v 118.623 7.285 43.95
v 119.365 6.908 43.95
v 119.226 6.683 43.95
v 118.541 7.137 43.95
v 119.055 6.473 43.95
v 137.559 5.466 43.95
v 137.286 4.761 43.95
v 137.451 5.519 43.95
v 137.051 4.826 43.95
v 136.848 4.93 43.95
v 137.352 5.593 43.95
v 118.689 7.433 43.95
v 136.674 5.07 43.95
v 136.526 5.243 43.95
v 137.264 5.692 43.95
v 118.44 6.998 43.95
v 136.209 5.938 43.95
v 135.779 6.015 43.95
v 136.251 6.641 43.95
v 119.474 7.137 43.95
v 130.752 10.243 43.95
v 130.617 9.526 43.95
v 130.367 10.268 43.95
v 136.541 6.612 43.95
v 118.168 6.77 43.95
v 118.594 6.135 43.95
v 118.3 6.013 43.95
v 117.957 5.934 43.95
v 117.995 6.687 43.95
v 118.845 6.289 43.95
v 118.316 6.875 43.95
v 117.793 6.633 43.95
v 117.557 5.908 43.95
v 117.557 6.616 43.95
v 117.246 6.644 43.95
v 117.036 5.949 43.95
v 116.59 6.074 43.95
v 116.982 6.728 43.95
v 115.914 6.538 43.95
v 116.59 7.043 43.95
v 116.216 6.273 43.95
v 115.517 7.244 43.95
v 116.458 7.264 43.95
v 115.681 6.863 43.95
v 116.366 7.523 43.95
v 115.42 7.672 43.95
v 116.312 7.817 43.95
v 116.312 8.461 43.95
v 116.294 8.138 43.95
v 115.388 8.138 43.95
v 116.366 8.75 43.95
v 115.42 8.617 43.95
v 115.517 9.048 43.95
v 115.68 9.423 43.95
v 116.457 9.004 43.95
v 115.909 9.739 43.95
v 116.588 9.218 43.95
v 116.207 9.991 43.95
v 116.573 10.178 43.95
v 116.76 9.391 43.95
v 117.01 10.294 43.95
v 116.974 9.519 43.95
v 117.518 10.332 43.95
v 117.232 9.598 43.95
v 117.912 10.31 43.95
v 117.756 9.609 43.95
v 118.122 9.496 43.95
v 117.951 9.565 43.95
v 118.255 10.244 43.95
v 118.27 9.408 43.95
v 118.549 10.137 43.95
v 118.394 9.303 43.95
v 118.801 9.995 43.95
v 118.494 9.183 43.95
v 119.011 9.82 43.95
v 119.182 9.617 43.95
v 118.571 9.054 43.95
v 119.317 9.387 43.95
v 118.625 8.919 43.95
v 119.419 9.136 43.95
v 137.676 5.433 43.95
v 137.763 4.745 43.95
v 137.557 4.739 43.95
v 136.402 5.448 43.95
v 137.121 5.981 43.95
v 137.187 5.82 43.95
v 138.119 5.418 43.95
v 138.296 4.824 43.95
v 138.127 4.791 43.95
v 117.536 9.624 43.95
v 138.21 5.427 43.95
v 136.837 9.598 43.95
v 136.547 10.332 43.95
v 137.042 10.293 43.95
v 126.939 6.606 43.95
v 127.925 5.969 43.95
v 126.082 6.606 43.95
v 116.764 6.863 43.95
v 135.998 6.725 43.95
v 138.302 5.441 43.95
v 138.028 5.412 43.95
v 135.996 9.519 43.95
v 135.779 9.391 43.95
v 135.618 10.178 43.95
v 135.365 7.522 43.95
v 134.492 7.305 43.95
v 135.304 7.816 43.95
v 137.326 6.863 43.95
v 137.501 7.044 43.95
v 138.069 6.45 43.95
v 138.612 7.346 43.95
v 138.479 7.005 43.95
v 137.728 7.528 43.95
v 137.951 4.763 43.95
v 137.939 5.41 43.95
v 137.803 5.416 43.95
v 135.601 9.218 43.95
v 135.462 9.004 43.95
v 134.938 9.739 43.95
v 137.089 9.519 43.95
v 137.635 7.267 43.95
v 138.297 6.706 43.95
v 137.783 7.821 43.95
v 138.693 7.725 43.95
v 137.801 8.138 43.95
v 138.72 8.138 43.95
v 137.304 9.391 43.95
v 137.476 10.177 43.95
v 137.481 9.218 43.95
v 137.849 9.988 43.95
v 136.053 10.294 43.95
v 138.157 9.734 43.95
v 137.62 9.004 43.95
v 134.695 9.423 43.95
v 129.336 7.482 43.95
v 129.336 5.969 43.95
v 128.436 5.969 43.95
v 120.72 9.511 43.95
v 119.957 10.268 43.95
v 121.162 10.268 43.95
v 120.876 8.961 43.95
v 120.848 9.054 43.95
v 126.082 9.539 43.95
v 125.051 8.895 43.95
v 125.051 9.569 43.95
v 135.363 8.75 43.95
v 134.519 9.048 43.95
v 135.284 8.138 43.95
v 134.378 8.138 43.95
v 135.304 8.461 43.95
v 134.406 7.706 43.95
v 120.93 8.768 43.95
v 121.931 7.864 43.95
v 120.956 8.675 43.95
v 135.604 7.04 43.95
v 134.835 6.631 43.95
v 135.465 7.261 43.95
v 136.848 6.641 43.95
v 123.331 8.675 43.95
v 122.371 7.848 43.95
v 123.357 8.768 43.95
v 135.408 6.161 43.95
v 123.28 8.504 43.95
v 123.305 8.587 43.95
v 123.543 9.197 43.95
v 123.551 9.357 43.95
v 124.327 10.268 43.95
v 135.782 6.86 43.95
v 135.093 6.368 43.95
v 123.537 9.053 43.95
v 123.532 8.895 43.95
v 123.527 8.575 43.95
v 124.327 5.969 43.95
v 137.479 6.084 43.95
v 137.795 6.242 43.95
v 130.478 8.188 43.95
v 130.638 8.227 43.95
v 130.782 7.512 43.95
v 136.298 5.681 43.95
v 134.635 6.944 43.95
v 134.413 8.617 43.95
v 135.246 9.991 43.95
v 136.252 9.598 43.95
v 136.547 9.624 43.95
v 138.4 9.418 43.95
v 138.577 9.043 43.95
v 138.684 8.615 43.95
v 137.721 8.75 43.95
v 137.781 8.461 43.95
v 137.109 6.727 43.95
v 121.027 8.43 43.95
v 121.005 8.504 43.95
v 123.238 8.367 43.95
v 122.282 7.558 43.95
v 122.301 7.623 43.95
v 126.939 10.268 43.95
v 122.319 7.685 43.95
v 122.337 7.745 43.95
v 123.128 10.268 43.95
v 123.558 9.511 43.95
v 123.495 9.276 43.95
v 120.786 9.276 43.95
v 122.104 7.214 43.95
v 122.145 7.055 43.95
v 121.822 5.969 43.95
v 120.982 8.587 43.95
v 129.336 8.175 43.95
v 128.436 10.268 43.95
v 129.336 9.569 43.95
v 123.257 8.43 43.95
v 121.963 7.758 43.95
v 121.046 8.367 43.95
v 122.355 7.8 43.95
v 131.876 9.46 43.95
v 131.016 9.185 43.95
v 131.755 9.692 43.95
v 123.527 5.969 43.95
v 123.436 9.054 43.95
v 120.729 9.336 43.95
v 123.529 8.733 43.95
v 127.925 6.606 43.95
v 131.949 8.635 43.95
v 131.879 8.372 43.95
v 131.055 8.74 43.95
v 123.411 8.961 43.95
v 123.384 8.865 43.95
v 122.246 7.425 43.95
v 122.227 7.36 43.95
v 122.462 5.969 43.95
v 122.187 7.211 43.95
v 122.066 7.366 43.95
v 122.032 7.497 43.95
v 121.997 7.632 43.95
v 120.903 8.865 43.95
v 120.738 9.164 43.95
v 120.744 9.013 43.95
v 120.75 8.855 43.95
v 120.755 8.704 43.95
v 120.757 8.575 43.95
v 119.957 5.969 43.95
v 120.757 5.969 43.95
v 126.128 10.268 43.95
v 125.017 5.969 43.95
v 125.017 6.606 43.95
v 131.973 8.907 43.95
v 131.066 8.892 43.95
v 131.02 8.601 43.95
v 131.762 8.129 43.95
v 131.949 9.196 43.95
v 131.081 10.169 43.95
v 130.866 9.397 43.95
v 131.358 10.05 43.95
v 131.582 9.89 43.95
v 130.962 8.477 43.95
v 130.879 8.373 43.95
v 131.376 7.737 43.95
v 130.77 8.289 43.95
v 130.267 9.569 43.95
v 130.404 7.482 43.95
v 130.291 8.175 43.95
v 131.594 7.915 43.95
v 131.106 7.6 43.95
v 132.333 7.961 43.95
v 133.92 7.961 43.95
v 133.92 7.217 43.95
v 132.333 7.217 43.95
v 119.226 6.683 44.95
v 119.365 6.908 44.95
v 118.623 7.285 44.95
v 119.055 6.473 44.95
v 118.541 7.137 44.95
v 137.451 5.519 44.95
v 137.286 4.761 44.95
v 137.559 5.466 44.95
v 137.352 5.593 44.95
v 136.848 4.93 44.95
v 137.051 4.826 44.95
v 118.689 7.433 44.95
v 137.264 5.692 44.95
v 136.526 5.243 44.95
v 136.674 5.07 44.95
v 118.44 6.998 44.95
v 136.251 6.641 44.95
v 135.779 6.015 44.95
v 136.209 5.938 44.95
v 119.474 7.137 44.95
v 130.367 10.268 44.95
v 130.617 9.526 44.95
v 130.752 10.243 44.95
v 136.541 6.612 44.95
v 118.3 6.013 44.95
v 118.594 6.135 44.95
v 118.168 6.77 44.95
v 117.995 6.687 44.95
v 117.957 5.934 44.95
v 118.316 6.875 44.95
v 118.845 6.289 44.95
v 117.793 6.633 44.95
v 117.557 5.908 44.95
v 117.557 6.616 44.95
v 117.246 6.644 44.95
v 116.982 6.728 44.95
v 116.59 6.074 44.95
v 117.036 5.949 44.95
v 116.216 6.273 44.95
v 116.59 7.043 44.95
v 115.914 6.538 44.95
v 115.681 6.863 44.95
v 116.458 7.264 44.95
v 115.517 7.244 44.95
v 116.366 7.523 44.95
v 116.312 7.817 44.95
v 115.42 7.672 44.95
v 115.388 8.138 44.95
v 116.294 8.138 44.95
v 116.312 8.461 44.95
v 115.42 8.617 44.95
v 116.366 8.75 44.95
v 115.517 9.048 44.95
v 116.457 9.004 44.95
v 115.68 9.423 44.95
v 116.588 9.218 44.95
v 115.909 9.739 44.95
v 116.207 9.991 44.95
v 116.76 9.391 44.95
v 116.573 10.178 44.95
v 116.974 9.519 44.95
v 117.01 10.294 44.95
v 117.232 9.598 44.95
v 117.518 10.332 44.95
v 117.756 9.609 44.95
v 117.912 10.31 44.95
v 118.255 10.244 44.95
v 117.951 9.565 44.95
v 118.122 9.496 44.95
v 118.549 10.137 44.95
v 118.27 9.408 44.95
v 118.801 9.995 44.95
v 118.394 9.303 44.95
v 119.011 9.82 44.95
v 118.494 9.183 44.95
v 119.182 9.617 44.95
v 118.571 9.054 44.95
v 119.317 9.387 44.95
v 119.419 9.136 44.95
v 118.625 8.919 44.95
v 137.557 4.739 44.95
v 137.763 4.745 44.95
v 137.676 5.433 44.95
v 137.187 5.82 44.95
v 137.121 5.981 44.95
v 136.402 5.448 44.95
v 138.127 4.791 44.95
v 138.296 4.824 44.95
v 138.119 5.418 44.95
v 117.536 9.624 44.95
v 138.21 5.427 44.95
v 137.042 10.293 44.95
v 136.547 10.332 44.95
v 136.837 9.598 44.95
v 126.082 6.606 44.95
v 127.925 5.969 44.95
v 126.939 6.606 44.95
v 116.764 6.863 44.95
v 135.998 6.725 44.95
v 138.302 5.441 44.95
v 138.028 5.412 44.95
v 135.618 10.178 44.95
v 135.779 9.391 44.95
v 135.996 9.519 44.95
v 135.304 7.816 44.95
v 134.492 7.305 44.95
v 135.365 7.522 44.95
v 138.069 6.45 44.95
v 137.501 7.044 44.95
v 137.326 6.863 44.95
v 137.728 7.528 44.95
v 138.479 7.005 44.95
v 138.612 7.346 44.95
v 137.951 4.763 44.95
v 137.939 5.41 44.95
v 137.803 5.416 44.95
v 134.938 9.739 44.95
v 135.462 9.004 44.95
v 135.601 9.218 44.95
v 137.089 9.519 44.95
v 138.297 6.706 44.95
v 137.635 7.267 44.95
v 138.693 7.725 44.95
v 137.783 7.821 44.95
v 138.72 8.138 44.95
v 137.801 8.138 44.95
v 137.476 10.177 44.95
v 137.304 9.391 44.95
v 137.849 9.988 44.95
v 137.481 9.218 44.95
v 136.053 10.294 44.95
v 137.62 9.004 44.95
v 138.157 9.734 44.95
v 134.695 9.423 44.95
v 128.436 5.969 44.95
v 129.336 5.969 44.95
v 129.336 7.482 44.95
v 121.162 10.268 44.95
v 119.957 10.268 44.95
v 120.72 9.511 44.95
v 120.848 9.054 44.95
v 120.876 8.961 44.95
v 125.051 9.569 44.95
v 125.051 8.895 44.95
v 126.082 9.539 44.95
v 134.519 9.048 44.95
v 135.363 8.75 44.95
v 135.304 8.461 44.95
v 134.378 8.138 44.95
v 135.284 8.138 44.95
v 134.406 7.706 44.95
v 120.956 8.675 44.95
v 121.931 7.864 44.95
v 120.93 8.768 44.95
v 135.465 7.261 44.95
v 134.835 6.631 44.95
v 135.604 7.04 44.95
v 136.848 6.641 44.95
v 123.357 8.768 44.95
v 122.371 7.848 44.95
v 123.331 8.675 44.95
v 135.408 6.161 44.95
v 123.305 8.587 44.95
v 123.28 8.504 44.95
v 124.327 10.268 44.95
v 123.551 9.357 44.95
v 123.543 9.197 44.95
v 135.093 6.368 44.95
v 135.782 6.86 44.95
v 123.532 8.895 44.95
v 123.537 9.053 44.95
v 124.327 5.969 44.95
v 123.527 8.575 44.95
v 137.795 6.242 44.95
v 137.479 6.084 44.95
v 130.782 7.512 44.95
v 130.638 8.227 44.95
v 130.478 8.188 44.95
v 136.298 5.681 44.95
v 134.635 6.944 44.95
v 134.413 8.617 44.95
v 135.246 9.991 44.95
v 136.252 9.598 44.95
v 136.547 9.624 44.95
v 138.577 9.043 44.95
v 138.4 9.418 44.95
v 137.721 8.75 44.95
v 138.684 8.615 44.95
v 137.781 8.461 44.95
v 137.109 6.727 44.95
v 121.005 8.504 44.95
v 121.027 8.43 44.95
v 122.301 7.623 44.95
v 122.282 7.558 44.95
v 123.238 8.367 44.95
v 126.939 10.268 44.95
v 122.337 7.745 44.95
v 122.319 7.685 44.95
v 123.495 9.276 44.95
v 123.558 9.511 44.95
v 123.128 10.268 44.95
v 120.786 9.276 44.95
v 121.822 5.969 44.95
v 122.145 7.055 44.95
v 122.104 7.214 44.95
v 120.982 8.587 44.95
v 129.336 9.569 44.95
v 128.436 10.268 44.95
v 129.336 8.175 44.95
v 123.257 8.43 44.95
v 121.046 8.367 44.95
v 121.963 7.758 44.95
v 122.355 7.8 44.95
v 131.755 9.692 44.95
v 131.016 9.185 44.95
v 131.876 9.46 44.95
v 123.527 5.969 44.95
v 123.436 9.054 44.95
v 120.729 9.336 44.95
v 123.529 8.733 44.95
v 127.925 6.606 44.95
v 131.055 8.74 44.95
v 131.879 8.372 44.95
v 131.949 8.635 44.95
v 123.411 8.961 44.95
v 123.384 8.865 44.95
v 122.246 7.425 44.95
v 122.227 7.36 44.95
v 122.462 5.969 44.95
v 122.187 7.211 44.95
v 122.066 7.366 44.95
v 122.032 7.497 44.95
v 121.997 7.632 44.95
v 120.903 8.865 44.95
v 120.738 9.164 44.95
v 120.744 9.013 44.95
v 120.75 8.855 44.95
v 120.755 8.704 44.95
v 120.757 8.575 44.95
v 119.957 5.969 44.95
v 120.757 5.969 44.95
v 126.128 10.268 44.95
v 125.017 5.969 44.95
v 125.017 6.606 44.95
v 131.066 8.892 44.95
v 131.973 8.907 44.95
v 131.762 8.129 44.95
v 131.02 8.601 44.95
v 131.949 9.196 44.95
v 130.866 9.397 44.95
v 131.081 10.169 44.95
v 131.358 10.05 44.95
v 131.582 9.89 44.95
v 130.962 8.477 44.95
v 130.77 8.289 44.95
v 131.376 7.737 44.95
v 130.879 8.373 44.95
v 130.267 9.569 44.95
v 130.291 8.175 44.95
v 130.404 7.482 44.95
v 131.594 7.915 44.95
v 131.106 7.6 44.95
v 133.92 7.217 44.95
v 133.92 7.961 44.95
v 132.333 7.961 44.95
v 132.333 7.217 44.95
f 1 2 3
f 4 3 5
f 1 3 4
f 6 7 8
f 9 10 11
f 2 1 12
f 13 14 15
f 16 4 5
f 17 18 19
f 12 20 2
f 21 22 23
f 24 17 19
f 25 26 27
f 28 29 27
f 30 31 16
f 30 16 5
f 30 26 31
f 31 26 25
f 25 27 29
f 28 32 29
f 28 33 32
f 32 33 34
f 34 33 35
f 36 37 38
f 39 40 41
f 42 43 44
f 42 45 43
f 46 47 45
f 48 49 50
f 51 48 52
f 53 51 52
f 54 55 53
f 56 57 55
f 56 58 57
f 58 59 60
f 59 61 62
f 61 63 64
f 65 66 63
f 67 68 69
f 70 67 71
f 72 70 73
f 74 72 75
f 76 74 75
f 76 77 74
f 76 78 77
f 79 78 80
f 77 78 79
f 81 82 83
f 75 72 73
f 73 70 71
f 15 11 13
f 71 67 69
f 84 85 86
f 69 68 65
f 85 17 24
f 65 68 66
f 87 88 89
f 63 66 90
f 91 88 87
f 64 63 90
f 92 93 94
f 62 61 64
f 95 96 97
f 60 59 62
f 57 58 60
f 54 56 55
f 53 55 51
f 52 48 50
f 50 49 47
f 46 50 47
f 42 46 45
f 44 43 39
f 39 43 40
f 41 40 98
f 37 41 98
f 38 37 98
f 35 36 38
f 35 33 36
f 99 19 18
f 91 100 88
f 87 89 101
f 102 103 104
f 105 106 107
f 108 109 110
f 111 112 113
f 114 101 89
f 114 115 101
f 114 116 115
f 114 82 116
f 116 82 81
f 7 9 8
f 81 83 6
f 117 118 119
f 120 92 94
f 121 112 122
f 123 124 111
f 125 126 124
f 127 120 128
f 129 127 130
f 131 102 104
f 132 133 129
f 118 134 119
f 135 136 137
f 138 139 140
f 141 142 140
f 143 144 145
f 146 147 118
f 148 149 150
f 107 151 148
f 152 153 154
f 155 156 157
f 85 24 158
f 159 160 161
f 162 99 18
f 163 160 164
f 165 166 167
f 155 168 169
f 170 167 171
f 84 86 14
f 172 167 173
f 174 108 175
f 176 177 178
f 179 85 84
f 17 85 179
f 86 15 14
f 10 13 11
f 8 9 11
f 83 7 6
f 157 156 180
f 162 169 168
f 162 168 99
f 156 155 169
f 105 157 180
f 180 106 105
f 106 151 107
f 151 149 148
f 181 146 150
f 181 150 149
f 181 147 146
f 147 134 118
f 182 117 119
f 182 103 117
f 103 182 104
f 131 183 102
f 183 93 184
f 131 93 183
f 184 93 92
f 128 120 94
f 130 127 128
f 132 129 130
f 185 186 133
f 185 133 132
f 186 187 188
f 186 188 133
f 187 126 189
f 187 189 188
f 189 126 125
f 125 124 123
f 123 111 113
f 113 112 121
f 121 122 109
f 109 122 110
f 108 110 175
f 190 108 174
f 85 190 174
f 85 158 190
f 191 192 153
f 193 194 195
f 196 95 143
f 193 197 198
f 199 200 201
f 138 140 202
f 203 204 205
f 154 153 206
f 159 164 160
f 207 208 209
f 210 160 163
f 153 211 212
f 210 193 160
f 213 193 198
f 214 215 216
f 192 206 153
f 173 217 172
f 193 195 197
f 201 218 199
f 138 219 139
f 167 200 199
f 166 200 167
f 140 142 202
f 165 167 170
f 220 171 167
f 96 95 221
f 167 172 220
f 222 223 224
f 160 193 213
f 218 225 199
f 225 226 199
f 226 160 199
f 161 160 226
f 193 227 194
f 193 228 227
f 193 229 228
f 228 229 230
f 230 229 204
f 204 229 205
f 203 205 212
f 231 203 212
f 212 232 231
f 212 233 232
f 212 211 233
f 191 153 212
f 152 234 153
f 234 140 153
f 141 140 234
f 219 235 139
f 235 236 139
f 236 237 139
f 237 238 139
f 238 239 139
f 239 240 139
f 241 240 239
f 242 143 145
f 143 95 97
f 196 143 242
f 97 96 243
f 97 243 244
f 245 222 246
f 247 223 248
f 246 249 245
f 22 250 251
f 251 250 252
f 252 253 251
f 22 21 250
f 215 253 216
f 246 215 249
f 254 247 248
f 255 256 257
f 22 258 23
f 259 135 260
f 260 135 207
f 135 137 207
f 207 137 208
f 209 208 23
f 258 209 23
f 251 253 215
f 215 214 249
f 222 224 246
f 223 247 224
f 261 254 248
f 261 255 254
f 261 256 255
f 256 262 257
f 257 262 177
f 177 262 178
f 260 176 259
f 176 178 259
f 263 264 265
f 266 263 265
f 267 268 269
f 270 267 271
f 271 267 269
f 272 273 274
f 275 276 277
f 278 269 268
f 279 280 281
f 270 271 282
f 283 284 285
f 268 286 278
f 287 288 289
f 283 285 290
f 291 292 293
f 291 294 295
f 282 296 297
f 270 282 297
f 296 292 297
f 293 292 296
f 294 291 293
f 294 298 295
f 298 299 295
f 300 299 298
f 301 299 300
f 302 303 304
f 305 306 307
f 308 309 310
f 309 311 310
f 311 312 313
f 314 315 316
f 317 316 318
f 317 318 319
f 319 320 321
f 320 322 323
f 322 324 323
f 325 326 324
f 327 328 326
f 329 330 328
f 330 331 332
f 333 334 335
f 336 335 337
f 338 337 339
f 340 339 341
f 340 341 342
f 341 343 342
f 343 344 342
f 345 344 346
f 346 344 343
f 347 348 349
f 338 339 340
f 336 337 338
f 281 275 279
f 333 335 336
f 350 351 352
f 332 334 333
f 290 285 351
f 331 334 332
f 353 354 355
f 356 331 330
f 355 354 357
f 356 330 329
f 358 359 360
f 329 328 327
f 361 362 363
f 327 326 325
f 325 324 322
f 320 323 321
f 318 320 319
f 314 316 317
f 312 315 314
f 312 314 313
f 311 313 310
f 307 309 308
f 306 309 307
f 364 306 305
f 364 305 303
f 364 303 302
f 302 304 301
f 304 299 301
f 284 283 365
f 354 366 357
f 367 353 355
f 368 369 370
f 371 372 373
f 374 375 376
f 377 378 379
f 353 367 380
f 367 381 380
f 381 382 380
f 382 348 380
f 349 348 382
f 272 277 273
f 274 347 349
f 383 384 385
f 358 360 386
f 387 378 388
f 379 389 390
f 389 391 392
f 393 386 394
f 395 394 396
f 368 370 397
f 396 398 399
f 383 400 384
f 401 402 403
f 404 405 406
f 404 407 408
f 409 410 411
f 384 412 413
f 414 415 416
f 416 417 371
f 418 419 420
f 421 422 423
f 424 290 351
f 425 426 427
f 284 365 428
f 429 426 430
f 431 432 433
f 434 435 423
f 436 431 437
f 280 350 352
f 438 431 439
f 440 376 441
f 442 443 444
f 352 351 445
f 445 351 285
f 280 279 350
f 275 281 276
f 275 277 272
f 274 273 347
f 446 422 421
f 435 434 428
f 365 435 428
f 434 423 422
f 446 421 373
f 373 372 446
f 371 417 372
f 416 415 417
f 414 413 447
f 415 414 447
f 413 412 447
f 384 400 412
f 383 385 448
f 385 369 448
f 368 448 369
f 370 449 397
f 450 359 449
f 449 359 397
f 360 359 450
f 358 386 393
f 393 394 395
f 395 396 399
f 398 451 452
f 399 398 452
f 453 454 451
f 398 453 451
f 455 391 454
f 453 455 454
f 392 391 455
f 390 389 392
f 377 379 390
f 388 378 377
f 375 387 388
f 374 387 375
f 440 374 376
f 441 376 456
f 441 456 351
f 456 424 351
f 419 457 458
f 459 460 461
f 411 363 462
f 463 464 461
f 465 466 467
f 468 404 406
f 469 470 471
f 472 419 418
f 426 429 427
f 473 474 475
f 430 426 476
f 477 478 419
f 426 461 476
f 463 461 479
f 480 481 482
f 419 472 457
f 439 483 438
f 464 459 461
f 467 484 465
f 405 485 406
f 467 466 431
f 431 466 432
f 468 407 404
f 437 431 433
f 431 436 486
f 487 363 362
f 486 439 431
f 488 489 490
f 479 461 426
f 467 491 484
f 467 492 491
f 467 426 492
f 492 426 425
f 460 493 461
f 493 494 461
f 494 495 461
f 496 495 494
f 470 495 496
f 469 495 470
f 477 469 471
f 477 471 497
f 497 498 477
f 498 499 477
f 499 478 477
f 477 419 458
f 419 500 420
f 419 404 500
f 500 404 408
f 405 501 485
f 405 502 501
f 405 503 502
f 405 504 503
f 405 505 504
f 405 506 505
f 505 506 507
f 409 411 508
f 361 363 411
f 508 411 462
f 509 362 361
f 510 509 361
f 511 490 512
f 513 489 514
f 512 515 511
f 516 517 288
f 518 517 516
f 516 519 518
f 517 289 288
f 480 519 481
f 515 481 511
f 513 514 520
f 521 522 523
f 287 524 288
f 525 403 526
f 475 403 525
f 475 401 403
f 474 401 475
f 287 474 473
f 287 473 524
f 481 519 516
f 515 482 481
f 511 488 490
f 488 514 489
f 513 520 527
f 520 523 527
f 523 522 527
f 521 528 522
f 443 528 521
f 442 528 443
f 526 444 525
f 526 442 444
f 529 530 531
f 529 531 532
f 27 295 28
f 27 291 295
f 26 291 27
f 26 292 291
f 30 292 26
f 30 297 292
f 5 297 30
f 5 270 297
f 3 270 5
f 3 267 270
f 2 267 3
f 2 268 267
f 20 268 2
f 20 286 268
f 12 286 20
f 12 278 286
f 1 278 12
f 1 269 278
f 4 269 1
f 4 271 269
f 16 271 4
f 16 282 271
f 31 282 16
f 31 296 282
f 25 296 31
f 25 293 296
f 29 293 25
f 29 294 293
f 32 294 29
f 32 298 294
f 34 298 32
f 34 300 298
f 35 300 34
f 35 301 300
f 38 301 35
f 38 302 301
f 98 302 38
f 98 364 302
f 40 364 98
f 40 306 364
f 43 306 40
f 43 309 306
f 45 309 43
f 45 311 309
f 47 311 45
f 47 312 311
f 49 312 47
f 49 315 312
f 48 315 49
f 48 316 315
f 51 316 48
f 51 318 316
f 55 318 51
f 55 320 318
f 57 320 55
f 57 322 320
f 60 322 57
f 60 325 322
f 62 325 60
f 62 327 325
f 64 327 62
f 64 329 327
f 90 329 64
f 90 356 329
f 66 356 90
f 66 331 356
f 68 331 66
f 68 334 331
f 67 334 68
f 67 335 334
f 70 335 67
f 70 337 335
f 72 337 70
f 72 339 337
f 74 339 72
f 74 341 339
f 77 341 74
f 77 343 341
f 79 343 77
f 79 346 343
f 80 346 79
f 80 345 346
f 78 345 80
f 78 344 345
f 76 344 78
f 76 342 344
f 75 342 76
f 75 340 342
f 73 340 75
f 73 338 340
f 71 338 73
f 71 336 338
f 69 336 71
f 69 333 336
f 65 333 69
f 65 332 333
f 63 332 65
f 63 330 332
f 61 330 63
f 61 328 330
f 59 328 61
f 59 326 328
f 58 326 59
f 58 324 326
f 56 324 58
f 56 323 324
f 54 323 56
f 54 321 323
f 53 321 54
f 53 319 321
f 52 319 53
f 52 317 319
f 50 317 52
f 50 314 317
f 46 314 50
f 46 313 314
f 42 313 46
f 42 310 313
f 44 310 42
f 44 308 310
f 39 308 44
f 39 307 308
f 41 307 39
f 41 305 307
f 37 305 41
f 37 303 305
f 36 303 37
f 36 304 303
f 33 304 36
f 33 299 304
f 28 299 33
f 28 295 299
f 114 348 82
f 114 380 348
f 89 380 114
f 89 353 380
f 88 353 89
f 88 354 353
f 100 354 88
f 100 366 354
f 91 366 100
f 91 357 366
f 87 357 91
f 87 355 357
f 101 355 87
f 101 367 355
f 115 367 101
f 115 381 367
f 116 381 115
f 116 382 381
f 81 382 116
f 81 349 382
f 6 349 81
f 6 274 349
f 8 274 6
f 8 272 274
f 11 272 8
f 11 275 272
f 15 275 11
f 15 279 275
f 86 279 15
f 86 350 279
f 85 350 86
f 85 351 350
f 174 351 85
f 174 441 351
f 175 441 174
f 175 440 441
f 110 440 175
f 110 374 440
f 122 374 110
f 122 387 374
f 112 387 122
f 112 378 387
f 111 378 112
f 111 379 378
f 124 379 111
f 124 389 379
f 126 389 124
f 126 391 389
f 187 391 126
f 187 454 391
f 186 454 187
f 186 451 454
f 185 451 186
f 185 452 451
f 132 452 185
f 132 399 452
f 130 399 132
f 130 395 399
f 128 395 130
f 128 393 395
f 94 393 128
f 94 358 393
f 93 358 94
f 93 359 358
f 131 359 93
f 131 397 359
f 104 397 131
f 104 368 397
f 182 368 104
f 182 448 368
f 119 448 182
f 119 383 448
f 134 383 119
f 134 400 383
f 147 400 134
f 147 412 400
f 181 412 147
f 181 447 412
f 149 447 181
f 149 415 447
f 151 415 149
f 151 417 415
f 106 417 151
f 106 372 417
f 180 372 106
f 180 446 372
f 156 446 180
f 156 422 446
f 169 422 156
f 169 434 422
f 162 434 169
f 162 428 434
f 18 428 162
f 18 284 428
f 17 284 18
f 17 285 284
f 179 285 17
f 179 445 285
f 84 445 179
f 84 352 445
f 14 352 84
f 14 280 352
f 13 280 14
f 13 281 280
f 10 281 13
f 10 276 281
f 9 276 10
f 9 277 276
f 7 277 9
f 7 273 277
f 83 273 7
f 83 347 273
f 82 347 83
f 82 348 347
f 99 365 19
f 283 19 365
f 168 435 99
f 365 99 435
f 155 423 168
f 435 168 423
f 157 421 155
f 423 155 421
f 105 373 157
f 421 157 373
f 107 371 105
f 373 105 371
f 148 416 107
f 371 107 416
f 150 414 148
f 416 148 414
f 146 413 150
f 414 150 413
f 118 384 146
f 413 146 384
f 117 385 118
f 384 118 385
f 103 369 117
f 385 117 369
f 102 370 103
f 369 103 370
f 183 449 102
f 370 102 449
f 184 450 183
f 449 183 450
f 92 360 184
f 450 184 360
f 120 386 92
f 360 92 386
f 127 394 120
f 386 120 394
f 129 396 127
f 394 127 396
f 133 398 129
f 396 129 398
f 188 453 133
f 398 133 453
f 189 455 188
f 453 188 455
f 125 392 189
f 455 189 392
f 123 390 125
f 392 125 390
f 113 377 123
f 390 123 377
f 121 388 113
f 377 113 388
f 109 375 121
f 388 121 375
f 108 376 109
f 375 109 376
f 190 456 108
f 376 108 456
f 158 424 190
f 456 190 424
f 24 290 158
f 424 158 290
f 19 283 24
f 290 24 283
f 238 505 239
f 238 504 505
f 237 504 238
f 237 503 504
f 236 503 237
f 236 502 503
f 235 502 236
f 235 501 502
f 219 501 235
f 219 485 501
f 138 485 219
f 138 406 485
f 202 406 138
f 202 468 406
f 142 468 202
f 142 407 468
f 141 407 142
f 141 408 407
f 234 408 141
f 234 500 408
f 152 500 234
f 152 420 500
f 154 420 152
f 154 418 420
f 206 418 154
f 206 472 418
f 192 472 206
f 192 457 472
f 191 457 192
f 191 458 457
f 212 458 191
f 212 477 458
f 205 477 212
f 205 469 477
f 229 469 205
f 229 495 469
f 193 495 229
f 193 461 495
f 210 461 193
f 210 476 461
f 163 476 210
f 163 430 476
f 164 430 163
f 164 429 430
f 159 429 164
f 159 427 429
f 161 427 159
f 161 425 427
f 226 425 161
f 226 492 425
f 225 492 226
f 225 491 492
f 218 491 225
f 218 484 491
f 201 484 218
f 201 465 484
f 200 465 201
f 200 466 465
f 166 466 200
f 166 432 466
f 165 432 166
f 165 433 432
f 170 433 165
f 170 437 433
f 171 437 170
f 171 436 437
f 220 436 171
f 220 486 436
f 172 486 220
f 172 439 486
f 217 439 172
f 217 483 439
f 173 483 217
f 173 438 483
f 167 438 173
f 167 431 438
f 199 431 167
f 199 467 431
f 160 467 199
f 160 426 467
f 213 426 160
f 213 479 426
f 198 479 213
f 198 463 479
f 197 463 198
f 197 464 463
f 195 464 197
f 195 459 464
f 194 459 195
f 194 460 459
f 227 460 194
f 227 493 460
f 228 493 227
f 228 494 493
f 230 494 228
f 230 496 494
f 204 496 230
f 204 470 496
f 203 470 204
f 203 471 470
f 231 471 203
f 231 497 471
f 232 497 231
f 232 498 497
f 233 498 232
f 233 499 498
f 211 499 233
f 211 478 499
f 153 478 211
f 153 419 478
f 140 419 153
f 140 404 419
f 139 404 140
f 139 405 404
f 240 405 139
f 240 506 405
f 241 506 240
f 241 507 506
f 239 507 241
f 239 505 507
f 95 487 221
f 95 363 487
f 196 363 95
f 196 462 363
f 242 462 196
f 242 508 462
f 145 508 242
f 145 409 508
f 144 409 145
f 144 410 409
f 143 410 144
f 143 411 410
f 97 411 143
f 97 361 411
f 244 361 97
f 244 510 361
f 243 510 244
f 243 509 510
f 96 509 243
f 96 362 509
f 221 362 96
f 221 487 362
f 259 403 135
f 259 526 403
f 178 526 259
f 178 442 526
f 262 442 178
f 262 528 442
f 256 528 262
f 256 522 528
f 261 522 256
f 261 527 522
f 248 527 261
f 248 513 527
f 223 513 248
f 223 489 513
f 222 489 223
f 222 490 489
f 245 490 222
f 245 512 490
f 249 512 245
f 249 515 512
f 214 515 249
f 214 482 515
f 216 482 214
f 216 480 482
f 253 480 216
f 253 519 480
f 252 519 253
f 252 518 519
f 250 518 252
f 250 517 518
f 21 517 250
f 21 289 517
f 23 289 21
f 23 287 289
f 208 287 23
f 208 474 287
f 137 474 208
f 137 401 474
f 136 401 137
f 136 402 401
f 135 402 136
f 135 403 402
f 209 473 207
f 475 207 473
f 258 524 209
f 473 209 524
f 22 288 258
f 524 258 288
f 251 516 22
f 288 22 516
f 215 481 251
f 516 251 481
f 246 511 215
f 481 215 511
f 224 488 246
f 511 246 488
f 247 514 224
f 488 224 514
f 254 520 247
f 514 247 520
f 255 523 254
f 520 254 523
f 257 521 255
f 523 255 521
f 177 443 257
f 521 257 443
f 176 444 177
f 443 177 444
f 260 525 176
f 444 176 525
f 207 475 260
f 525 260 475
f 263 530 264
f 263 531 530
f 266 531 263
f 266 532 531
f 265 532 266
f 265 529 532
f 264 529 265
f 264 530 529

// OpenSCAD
// CM1P-Q ID text, engraved 0.5 into the plate's top face (frame as cm1p_k_freecad.py).
translate([127, 7.5, 43.95]) linear_extrude(1) text("CM1P-Q", size = 4.5, font = "Liberation Sans:style=Bold", halign = "center", valign = "center");
